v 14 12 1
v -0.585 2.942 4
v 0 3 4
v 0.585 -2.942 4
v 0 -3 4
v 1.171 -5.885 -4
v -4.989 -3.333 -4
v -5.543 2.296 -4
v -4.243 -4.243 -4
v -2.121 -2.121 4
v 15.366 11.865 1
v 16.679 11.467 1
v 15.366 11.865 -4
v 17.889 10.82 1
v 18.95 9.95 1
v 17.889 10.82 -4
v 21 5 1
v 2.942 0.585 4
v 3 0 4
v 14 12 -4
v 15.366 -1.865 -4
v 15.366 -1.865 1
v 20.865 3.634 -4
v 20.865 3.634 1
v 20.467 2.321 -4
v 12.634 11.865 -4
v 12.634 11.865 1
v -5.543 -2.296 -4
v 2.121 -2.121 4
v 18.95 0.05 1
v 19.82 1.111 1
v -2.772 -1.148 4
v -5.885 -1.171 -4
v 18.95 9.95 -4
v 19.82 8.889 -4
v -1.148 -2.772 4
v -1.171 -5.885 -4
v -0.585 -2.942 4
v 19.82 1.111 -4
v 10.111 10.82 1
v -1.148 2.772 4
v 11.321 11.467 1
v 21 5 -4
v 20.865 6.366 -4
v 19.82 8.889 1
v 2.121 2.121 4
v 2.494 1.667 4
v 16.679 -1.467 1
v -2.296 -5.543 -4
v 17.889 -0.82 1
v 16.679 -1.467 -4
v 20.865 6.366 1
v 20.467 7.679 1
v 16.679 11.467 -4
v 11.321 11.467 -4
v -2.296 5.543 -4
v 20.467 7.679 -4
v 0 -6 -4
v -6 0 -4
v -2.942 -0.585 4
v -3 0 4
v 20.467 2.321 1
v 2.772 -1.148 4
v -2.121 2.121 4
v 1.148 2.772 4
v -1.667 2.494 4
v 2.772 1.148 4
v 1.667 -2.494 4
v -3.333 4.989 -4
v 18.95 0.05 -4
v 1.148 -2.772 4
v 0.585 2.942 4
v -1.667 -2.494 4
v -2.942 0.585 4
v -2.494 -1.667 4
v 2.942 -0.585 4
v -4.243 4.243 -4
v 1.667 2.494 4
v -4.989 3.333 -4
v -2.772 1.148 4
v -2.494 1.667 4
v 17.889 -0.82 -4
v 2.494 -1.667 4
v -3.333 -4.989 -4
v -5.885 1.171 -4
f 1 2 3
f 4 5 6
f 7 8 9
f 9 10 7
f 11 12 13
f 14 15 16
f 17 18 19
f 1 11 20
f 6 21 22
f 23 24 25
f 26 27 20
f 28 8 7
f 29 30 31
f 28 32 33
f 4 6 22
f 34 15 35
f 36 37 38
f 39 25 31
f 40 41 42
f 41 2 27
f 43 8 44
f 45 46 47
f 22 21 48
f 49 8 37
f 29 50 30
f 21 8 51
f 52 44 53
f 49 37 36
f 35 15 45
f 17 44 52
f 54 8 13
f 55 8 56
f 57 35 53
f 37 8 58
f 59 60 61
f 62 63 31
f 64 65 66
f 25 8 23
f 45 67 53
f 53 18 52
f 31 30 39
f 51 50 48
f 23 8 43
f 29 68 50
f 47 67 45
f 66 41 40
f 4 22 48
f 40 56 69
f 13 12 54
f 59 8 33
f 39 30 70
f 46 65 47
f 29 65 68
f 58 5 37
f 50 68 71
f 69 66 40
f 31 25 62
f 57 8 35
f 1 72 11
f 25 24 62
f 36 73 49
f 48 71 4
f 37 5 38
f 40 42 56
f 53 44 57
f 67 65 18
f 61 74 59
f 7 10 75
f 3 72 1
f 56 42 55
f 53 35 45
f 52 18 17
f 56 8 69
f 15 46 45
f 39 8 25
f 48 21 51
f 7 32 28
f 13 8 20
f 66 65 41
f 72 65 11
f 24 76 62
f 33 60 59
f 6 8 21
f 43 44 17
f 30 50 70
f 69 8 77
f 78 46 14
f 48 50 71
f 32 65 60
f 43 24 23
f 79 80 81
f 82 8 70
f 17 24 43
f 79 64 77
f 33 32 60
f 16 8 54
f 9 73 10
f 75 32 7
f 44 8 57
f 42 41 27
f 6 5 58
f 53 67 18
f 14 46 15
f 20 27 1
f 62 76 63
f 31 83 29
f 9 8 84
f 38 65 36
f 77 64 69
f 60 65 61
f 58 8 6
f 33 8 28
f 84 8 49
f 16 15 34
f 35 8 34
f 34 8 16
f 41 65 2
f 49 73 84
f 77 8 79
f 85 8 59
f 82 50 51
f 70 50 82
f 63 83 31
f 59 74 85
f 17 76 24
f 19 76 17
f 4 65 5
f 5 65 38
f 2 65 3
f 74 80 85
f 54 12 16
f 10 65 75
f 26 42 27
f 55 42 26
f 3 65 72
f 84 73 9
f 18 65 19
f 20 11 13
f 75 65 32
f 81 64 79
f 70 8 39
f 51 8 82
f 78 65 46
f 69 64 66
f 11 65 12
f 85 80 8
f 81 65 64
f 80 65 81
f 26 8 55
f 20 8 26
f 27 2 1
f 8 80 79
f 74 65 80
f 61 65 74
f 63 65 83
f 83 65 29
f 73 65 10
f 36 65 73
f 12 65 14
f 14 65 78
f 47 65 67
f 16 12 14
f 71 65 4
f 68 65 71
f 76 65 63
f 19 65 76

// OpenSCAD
// =============================================================================
// test_hull_cone_to_cylinder.scad
//
// Hull between a cone (tapered cylinder) and a regular cylinder.
// Pattern from: compact_nut_seat.scad, illumination.scad
// Expected: convex hull of dissimilar curved primitives with different radii.
// =============================================================================

$fn = 32;

hull() {
    cylinder(r1 = 6, r2 = 3, h = 8, center = true);
    translate([14, 5, -4]) {
        cylinder(r = 7, h = 5);
    }
}
